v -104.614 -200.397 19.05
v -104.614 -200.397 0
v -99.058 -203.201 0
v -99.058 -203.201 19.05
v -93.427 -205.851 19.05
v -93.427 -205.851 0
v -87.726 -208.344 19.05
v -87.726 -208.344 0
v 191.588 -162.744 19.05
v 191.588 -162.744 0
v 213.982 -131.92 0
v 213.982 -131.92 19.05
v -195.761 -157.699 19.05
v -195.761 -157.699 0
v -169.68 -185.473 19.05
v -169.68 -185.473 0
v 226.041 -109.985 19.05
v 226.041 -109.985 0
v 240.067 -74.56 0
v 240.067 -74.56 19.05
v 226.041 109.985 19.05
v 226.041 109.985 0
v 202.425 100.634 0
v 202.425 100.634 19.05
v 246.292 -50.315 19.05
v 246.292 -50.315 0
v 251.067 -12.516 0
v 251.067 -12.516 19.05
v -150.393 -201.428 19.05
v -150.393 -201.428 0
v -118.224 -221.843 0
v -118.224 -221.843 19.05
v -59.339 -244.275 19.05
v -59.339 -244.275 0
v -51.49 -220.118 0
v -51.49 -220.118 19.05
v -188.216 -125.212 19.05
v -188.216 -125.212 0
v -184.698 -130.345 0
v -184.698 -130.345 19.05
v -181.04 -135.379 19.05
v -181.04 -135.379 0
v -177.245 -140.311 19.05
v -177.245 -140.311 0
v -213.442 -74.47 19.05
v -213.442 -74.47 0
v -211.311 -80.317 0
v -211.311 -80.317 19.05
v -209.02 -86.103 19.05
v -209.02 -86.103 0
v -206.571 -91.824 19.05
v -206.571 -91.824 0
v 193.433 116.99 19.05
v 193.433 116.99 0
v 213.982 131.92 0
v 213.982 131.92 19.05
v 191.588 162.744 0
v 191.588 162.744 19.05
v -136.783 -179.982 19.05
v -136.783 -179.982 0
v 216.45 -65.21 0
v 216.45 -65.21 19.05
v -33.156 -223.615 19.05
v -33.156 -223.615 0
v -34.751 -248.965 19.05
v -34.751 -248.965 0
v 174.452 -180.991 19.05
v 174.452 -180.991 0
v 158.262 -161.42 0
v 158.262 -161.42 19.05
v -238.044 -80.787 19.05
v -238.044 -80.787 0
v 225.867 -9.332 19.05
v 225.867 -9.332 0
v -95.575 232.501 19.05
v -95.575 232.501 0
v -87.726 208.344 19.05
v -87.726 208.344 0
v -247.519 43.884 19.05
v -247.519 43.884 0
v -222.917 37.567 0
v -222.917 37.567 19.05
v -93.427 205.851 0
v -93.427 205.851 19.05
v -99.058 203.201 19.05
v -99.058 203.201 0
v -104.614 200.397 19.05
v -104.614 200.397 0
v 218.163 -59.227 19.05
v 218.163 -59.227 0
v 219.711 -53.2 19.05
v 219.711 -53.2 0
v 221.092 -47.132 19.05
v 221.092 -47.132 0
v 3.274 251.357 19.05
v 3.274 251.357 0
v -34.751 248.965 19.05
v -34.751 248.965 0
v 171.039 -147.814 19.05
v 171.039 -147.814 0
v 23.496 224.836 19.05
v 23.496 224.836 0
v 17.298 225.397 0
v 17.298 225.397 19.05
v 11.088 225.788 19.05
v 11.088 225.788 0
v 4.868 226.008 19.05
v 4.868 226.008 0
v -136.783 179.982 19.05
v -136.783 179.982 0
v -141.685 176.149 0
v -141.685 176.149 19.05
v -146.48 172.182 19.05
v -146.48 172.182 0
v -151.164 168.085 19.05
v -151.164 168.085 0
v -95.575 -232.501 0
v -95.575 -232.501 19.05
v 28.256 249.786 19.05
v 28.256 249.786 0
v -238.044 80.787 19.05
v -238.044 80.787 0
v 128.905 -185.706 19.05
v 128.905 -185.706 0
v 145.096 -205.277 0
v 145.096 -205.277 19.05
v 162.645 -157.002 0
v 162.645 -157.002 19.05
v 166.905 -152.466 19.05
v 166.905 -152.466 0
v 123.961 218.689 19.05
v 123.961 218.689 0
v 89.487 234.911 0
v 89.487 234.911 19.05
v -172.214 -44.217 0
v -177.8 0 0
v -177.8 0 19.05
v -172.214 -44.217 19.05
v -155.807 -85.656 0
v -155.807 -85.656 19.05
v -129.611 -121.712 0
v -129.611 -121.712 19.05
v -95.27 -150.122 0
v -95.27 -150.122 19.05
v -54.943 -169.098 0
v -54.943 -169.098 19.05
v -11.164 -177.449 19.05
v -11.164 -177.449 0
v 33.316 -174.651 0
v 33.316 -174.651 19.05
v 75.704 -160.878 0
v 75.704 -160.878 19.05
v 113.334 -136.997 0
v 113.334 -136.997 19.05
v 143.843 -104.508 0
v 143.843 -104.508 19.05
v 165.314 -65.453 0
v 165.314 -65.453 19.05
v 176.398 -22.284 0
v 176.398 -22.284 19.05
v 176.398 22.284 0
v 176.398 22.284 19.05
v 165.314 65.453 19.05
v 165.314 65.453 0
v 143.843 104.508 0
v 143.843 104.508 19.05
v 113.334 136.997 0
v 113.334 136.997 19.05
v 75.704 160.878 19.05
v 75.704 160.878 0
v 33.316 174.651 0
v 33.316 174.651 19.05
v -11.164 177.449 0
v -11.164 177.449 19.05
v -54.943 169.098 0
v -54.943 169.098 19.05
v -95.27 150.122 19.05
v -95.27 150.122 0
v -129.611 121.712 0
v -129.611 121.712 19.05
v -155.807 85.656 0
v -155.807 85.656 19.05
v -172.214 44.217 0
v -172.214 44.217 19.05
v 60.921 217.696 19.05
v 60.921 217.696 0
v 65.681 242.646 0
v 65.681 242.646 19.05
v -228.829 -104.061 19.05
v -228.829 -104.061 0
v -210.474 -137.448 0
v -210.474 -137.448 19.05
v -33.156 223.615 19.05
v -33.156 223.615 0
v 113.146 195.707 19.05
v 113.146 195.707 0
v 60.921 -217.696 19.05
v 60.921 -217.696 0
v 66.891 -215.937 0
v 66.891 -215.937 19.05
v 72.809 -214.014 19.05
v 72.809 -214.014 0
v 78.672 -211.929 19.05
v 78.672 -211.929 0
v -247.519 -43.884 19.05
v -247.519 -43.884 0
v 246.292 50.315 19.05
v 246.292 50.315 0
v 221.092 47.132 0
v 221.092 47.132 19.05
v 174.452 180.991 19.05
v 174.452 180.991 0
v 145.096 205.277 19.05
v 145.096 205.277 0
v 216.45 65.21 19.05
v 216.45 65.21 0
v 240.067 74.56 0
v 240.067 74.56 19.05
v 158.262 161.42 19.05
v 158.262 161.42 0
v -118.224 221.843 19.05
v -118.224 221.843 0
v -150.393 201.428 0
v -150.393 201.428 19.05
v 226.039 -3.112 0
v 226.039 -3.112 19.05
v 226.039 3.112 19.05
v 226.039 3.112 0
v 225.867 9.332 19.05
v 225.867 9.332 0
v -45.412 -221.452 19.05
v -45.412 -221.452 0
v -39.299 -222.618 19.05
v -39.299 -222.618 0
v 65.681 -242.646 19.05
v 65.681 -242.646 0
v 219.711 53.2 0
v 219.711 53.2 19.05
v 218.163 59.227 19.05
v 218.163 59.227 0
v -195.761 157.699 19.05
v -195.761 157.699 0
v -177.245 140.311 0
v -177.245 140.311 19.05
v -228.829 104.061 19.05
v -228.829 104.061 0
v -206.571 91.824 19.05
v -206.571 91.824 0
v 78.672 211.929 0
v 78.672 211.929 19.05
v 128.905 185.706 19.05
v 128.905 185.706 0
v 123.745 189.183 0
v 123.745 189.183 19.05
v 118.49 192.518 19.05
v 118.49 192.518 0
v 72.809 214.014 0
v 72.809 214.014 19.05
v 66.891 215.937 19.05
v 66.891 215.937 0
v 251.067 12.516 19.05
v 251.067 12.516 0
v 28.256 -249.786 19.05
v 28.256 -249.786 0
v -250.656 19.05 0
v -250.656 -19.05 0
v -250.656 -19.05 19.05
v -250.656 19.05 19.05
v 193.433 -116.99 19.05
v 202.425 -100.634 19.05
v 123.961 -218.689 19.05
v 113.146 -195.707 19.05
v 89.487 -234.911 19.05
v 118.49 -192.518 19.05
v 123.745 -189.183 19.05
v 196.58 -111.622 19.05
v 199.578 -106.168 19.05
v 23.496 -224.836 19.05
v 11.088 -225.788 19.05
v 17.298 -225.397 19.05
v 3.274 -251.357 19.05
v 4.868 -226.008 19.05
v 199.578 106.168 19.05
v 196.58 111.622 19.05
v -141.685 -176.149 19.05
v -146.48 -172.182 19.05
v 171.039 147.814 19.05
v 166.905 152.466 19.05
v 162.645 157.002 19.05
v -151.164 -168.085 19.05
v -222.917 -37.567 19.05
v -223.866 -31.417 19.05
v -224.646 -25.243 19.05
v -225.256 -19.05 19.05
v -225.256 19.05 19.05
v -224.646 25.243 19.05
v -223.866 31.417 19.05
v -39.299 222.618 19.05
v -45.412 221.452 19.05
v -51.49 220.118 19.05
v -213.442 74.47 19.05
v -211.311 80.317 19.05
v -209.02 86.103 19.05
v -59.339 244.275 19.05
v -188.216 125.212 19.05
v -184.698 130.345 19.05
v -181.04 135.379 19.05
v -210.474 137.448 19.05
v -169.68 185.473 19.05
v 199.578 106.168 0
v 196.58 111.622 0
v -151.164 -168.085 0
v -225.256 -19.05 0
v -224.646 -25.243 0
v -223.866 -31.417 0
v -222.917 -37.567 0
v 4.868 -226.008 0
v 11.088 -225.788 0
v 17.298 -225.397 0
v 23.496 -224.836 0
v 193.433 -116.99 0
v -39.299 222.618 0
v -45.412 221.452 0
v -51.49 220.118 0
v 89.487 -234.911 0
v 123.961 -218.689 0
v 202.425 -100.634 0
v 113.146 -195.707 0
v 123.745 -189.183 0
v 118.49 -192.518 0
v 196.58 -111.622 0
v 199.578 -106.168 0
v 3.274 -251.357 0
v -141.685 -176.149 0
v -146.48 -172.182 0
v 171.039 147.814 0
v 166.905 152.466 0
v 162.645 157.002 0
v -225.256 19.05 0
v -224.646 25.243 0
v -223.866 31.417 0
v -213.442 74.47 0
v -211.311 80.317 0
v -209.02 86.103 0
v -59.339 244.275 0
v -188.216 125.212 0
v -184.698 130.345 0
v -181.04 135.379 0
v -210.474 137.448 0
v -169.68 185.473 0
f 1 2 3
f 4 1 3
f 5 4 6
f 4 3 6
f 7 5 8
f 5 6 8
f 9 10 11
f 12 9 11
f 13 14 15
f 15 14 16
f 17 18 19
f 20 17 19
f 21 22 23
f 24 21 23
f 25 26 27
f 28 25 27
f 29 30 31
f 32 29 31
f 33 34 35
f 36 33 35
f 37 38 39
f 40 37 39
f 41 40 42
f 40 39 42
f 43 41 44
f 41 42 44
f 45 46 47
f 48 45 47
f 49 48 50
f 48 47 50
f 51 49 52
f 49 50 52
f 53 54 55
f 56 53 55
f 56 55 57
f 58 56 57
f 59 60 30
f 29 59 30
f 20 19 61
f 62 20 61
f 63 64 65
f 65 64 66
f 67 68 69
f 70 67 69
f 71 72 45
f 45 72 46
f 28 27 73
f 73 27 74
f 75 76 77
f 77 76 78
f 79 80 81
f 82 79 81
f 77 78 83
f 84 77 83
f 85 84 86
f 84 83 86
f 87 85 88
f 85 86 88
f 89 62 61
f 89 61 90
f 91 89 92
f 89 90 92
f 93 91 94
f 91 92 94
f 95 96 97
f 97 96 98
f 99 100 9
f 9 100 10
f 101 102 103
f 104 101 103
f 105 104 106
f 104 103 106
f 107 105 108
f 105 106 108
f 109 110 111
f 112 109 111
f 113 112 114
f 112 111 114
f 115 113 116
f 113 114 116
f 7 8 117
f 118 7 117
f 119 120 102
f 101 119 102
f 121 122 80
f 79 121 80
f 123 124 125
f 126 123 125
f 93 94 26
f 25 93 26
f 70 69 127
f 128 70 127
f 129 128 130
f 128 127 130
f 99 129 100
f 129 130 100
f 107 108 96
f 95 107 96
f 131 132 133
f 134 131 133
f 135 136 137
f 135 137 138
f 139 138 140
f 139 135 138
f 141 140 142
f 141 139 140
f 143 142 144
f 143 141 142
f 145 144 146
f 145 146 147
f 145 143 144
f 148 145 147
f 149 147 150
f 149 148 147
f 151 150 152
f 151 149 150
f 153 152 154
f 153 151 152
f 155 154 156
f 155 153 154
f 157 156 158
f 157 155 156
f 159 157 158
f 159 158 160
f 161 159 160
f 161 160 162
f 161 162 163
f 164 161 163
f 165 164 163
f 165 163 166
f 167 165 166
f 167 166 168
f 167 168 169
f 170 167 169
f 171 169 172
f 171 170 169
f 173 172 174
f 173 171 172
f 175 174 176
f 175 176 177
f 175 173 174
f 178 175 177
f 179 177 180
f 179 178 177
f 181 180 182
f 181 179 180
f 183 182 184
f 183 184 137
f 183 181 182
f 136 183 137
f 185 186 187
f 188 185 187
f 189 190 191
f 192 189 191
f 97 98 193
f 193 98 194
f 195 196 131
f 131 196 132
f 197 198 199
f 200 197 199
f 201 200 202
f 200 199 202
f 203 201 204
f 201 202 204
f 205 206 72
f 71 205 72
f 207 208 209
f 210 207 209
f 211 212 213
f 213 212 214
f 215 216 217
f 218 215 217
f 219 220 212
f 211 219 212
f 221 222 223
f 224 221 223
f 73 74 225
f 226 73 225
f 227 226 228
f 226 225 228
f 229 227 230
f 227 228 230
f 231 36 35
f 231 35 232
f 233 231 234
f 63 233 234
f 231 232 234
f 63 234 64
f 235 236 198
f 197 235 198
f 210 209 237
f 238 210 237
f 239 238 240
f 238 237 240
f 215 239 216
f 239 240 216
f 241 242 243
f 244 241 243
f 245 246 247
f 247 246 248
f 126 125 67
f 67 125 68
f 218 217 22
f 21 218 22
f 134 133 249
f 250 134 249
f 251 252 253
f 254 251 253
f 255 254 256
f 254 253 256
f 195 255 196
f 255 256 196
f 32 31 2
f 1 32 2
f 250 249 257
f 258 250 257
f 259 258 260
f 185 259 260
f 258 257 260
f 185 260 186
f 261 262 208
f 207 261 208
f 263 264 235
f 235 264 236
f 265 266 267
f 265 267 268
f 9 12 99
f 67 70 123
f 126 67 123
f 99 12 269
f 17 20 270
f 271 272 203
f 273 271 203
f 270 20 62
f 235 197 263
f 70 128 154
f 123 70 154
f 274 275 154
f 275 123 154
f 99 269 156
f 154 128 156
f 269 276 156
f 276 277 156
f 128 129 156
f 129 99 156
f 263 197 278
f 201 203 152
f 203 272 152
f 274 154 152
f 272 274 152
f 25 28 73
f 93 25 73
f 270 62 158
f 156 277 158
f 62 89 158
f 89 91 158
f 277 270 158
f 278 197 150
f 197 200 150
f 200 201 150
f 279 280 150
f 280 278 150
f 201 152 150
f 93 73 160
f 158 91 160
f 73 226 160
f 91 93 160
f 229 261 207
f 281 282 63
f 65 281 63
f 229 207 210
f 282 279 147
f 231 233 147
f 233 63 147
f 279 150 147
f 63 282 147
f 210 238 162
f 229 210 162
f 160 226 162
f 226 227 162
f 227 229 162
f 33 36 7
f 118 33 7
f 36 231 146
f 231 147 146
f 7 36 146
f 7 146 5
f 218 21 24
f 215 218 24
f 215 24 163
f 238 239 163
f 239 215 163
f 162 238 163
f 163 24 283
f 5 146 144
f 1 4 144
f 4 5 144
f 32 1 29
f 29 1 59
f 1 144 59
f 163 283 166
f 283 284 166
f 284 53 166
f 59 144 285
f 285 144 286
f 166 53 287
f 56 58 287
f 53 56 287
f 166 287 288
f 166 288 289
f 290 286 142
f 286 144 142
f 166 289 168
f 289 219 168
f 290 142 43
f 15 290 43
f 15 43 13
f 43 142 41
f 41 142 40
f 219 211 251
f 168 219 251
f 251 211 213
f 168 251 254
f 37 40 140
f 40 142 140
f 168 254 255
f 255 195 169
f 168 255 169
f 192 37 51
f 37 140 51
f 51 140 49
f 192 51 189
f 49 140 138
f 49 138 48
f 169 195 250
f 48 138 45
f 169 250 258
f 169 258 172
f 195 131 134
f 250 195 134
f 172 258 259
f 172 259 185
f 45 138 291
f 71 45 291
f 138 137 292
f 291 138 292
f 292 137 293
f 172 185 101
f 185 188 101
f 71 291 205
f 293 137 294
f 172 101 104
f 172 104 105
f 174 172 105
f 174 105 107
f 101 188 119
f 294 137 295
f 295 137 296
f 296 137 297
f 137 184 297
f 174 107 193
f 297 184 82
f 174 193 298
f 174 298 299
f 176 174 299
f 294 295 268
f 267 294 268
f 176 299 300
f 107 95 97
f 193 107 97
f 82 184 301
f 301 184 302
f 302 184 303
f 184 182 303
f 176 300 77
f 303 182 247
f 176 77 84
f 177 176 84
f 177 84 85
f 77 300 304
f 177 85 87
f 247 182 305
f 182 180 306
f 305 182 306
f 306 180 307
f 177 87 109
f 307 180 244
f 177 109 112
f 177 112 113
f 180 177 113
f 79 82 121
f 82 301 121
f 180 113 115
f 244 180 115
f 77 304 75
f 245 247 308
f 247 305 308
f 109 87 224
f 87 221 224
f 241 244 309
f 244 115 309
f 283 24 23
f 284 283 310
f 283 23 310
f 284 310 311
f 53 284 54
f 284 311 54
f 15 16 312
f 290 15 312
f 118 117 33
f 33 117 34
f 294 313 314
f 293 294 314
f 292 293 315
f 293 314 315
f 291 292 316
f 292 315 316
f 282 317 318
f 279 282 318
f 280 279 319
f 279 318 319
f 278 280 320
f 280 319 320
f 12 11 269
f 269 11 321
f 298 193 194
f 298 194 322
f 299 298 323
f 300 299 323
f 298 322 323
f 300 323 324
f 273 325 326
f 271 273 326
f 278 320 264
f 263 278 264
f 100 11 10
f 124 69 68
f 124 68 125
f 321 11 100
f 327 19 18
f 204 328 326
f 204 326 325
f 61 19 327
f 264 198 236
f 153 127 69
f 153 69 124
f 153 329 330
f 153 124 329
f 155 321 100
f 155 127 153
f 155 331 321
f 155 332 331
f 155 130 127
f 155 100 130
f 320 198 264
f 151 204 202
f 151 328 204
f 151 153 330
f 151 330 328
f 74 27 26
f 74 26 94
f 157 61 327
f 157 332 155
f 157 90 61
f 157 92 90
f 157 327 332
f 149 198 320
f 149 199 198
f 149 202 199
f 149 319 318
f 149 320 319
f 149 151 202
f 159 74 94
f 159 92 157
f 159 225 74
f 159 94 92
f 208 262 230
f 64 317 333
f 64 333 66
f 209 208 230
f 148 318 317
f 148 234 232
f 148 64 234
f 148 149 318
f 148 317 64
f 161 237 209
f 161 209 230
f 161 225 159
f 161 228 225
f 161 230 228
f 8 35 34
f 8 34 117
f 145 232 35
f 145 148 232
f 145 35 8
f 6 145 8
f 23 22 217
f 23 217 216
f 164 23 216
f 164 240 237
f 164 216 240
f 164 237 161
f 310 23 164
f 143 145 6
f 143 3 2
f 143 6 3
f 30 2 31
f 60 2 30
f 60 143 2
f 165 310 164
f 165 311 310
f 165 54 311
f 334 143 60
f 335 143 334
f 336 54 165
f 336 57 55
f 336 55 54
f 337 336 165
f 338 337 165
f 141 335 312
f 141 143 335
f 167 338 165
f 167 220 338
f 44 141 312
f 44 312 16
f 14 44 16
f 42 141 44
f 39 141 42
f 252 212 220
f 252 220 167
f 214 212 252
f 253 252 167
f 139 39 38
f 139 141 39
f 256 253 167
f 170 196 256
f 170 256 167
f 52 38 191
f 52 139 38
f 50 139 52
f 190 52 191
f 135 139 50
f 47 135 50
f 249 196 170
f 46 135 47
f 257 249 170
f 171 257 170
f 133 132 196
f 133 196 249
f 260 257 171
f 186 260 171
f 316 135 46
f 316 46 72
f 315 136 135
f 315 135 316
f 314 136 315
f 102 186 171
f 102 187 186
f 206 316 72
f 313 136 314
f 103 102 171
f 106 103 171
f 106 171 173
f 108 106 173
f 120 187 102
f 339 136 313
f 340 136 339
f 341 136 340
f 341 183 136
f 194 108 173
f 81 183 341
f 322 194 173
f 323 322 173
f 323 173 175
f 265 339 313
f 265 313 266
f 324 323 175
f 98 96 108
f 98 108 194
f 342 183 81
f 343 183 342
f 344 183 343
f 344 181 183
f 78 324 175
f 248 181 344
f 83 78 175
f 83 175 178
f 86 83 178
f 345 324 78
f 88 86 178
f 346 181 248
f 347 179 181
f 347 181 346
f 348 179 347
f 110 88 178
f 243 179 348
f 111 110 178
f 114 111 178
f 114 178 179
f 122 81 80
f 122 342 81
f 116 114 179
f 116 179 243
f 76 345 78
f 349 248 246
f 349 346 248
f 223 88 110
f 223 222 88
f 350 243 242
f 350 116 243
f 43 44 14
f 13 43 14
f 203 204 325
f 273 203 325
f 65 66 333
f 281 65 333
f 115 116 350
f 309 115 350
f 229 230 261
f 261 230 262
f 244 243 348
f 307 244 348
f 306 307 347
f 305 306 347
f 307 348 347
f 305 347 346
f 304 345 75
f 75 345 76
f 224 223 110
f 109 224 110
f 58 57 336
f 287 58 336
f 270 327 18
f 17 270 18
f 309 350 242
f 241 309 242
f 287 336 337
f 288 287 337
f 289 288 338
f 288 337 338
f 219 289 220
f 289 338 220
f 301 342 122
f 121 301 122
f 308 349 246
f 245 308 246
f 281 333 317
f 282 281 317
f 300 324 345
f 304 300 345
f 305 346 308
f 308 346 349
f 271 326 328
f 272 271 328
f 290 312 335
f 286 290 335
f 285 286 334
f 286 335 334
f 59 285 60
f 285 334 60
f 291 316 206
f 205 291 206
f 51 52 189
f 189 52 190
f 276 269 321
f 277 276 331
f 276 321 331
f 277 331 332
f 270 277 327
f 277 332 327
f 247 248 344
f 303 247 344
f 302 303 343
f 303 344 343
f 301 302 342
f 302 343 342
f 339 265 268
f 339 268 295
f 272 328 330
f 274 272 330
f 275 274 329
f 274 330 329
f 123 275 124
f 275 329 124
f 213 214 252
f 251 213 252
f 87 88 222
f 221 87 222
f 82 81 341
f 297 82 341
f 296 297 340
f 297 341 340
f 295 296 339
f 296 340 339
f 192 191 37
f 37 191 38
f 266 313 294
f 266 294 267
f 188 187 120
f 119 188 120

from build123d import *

# Parameters (mm, degrees)
SKETCH1_R           = 226.06
SKETCH1_R_2         = 177.8
BOSS_EXTRUDE1_DEPTH = 19.05
BOSS_EXTRUDE2_START = -19.05
BOSS_EXTRUDE2_DEPTH = 19.05


with BuildPart() as part:
    # Sketch1 → Boss-Extrude1 (new body)
    with BuildSketch(Plane.XY):
        with Locations(Location((0, 0, 0), (0, 0, 180))):
            Circle(SKETCH1_R)
        with Locations(Location((0, 0, 0), (0, 0, 180))):
            Circle(SKETCH1_R_2, mode=Mode.SUBTRACT)
    extrude(amount=BOSS_EXTRUDE1_DEPTH)

    # Sketch2 → Boss-Extrude2 (add)
    with BuildSketch(Plane.XY.offset(19.05).offset(BOSS_EXTRUDE2_START)):
        with BuildLine():
            Line((-250.655901366, 19.05), (-225.255901366, 19.05))
            ThreePointArc((-225.255901366, 19.05), (-226.06, 0), (-225.255901366, -19.05))
            Line((-225.255901366, -19.05), (-250.655901366, -19.05))
            Line((-250.655901366, -19.05), (-250.655901366, 19.05))
        make_face()
        with BuildLine():
            Line((-247.518627651, 43.884078608), (-222.916615358, 37.567355474))
            ThreePointArc((-222.916615358, 37.567355474), (-218.957909405, 56.218835892), (-213.441530657, 74.470373913))
            Line((-213.441530657, 74.470373913), (-238.04354295, 80.787097047))
            Line((-238.04354295, 80.787097047), (-247.518627651, 43.884078608))
        make_face()
        with BuildLine():
            Line((-228.828848251, 104.060759163), (-206.570658578, 91.824215841))
            ThreePointArc((-206.570658578, 91.824215841), (-198.097888091, 108.905235567), (-188.215843594, 125.211500351))
            Line((-188.215843594, 125.211500351), (-210.474033267, 137.448043673))
            Line((-210.474033267, 137.448043673), (-228.828848251, 104.060759163))
        make_face()
        with BuildLine():
            Line((-195.760910741, 157.698919511), (-177.245107605, 140.311423021))
            ThreePointArc((-177.245107605, 140.311423021), (-164.790647915, 154.748718766), (-151.163862869, 168.085127726))
            Line((-151.163862869, 168.085127726), (-169.679666006, 185.472624216))
            Line((-169.679666006, 185.472624216), (-195.760910741, 157.698919511))
        make_face()
        with BuildLine():
            Line((-150.392595252, 201.42827677), (-136.78259466, 179.982347463))
            ThreePointArc((-136.78259466, 179.982347463), (-121.129005273, 190.868770839), (-104.613700698, 200.397348351))
            Line((-104.613700698, 200.397348351), (-118.22370129, 221.843277659))
            Line((-118.22370129, 221.843277659), (-150.392595252, 201.42827677))
        make_face()
        with BuildLine():
            Line((-95.574559898, 232.501154599), (-87.725528241, 208.344319085))
            ThreePointArc((-87.725528241, 208.344319085), (-69.856381748, 214.995836074), (-51.49027497, 220.11786657))
            Line((-51.49027497, 220.11786657), (-59.339306627, 244.274702084))
            Line((-59.339306627, 244.274702084), (-95.574559898, 232.501154599))
        make_face()
        with BuildLine():
            Line((-34.751223446, 248.965129804), (-33.15634425, 223.615250902))
            ThreePointArc((-33.15634425, 223.615250902), (-14.194424845, 225.613922228), (4.868474103, 226.007569696))
            Line((4.868474103, 226.007569696), (3.273594907, 251.357448598))
            Line((3.273594907, 251.357448598), (-34.751223446, 248.965129804))
        make_face()
        with BuildLine():
            Line((28.25566018, 249.785710274), (23.49617479, 224.835614106))
            ThreePointArc((23.49617479, 224.835614106), (42.359419975, 222.0558559), (60.921319042, 217.69638602))
            Line((60.921319042, 217.69638602), (65.680804433, 242.646482188))
            Line((65.680804433, 242.646482188), (28.25566018, 249.785710274))
        make_face()
        with BuildLine():
            Line((89.487136761, 234.91133592), (78.672342755, 211.928728787))
            ThreePointArc((78.672342755, 211.928728787), (96.251666651, 204.54520348), (113.146253454, 195.706537779))
            Line((113.146253454, 195.706537779), (123.96104746, 218.689144911))
            Line((123.96104746, 218.689144911), (89.487136761, 234.91133592))
        make_face()
        with BuildLine():
            Line((145.095807428, 205.276618387), (128.905238088, 185.70558202))
            ThreePointArc((128.905238088, 185.70558202), (144.096067123, 174.182223662), (158.261792638, 161.419728011))
            Line((158.261792638, 161.419728011), (174.452361977, 180.990764377))
            Line((174.452361977, 180.990764377), (145.095807428, 205.276618387))
        make_face()
        with BuildLine():
            Line((191.587574889, 162.743615966), (171.038543232, 147.813870557))
            ThreePointArc((171.038543232, 147.813870557), (182.886381748, 132.874734133), (193.433161344, 116.990323072))
            Line((193.433161344, 116.990323072), (213.982193001, 131.92006848))
            Line((213.982193001, 131.92006848), (191.587574889, 162.743615966))
        make_face()
        with BuildLine():
            Line((226.04119041, 109.984833624), (202.424867669, 100.634469986))
            ThreePointArc((202.424867669, 100.634469986), (210.1852724, 83.21823638), (216.450413126, 65.209985874))
            Line((216.450413126, 65.209985874), (240.066735867, 74.560349512))
            Line((240.066735867, 74.560349512), (226.04119041, 109.984833624))
        make_face()
        with BuildLine():
            Line((246.291806617, 50.31529969), (221.092093203, 47.131835558))
            ThreePointArc((221.092093203, 47.131835558), (224.277449379, 28.33283078), (225.867289402, 9.332265438))
            Line((225.867289402, 9.332265438), (251.067002815, 12.51572957))
            Line((251.067002815, 12.51572957), (246.291806617, 50.31529969))
        make_face()
        with BuildLine():
            Line((251.067002815, -12.51572957), (225.867289402, -9.332265438))
            ThreePointArc((225.867289402, -9.332265438), (224.277449379, -28.33283078), (221.092093203, -47.131835558))
            Line((221.092093203, -47.131835558), (246.291806617, -50.31529969))
            Line((246.291806617, -50.31529969), (251.067002815, -12.51572957))
        make_face()
        with BuildLine():
            Line((240.066735867, -74.560349512), (216.450413126, -65.209985874))
            ThreePointArc((216.450413126, -65.209985874), (210.1852724, -83.21823638), (202.424867669, -100.634469986))
            Line((202.424867669, -100.634469986), (226.04119041, -109.984833624))
            Line((226.04119041, -109.984833624), (240.066735867, -74.560349512))
        make_face()
        with BuildLine():
            Line((213.982193001, -131.92006848), (193.433161344, -116.990323072))
            ThreePointArc((193.433161344, -116.990323072), (182.886381748, -132.874734133), (171.038543232, -147.813870557))
            Line((171.038543232, -147.813870557), (191.587574889, -162.743615966))
            Line((191.587574889, -162.743615966), (213.982193001, -131.92006848))
        make_face()
        with BuildLine():
            Line((174.452361977, -180.990764377), (158.261792638, -161.419728011))
            ThreePointArc((158.261792638, -161.419728011), (144.096067123, -174.182223662), (128.905238088, -185.70558202))
            Line((128.905238088, -185.70558202), (145.095807428, -205.276618387))
            Line((145.095807428, -205.276618387), (174.452361977, -180.990764377))
        make_face()
        with BuildLine():
            Line((123.961047459, -218.689144911), (113.146253454, -195.706537779))
            ThreePointArc((113.146253454, -195.706537779), (96.251666651, -204.54520348), (78.672342755, -211.928728787))
            Line((78.672342755, -211.928728787), (89.487136761, -234.91133592))
            Line((89.487136761, -234.91133592), (123.961047459, -218.689144911))
        make_face()
        with BuildLine():
            Line((65.680804433, -242.646482188), (60.921319042, -217.69638602))
            ThreePointArc((60.921319042, -217.69638602), (42.359419975, -222.0558559), (23.49617479, -224.835614106))
            Line((23.49617479, -224.835614106), (28.25566018, -249.785710274))
            Line((28.25566018, -249.785710274), (65.680804433, -242.646482188))
        make_face()
        with BuildLine():
            Line((3.273594907, -251.357448598), (4.868474103, -226.007569696))
            ThreePointArc((4.868474103, -226.007569696), (-14.194424845, -225.613922228), (-33.15634425, -223.615250902))
            Line((-33.15634425, -223.615250902), (-34.751223446, -248.965129804))
            Line((-34.751223446, -248.965129804), (3.273594907, -251.357448598))
        make_face()
        with BuildLine():
            Line((-59.339306627, -244.274702084), (-51.49027497, -220.11786657))
            ThreePointArc((-51.49027497, -220.11786657), (-69.856381748, -214.995836074), (-87.725528241, -208.344319085))
            Line((-87.725528241, -208.344319085), (-95.574559898, -232.501154599))
            Line((-95.574559898, -232.501154599), (-59.339306627, -244.274702084))
        make_face()
        with BuildLine():
            Line((-118.22370129, -221.843277659), (-104.613700698, -200.397348351))
            ThreePointArc((-104.613700698, -200.397348351), (-121.129005273, -190.868770839), (-136.78259466, -179.982347463))
            Line((-136.78259466, -179.982347463), (-150.392595252, -201.42827677))
            Line((-150.392595252, -201.42827677), (-118.22370129, -221.843277659))
        make_face()
        with BuildLine():
            Line((-169.679666006, -185.472624216), (-151.163862869, -168.085127726))
            ThreePointArc((-151.163862869, -168.085127726), (-164.790647915, -154.748718766), (-177.245107605, -140.311423021))
            Line((-177.245107605, -140.311423021), (-195.760910741, -157.698919511))
            Line((-195.760910741, -157.698919511), (-169.679666006, -185.472624216))
        make_face()
        with BuildLine():
            Line((-210.474033267, -137.448043673), (-188.215843594, -125.211500351))
            ThreePointArc((-188.215843594, -125.211500351), (-198.097888091, -108.905235567), (-206.570658578, -91.824215841))
            Line((-206.570658578, -91.824215841), (-228.828848251, -104.060759163))
            Line((-228.828848251, -104.060759163), (-210.474033267, -137.448043673))
        make_face()
        with BuildLine():
            Line((-238.04354295, -80.787097047), (-213.441530657, -74.470373913))
            ThreePointArc((-213.441530657, -74.470373913), (-218.957909405, -56.218835892), (-222.916615358, -37.567355474))
            Line((-222.916615358, -37.567355474), (-247.518627651, -43.884078608))
            Line((-247.518627651, -43.884078608), (-238.04354295, -80.787097047))
        make_face()
    extrude(amount=BOSS_EXTRUDE2_DEPTH)


solid = part.part
